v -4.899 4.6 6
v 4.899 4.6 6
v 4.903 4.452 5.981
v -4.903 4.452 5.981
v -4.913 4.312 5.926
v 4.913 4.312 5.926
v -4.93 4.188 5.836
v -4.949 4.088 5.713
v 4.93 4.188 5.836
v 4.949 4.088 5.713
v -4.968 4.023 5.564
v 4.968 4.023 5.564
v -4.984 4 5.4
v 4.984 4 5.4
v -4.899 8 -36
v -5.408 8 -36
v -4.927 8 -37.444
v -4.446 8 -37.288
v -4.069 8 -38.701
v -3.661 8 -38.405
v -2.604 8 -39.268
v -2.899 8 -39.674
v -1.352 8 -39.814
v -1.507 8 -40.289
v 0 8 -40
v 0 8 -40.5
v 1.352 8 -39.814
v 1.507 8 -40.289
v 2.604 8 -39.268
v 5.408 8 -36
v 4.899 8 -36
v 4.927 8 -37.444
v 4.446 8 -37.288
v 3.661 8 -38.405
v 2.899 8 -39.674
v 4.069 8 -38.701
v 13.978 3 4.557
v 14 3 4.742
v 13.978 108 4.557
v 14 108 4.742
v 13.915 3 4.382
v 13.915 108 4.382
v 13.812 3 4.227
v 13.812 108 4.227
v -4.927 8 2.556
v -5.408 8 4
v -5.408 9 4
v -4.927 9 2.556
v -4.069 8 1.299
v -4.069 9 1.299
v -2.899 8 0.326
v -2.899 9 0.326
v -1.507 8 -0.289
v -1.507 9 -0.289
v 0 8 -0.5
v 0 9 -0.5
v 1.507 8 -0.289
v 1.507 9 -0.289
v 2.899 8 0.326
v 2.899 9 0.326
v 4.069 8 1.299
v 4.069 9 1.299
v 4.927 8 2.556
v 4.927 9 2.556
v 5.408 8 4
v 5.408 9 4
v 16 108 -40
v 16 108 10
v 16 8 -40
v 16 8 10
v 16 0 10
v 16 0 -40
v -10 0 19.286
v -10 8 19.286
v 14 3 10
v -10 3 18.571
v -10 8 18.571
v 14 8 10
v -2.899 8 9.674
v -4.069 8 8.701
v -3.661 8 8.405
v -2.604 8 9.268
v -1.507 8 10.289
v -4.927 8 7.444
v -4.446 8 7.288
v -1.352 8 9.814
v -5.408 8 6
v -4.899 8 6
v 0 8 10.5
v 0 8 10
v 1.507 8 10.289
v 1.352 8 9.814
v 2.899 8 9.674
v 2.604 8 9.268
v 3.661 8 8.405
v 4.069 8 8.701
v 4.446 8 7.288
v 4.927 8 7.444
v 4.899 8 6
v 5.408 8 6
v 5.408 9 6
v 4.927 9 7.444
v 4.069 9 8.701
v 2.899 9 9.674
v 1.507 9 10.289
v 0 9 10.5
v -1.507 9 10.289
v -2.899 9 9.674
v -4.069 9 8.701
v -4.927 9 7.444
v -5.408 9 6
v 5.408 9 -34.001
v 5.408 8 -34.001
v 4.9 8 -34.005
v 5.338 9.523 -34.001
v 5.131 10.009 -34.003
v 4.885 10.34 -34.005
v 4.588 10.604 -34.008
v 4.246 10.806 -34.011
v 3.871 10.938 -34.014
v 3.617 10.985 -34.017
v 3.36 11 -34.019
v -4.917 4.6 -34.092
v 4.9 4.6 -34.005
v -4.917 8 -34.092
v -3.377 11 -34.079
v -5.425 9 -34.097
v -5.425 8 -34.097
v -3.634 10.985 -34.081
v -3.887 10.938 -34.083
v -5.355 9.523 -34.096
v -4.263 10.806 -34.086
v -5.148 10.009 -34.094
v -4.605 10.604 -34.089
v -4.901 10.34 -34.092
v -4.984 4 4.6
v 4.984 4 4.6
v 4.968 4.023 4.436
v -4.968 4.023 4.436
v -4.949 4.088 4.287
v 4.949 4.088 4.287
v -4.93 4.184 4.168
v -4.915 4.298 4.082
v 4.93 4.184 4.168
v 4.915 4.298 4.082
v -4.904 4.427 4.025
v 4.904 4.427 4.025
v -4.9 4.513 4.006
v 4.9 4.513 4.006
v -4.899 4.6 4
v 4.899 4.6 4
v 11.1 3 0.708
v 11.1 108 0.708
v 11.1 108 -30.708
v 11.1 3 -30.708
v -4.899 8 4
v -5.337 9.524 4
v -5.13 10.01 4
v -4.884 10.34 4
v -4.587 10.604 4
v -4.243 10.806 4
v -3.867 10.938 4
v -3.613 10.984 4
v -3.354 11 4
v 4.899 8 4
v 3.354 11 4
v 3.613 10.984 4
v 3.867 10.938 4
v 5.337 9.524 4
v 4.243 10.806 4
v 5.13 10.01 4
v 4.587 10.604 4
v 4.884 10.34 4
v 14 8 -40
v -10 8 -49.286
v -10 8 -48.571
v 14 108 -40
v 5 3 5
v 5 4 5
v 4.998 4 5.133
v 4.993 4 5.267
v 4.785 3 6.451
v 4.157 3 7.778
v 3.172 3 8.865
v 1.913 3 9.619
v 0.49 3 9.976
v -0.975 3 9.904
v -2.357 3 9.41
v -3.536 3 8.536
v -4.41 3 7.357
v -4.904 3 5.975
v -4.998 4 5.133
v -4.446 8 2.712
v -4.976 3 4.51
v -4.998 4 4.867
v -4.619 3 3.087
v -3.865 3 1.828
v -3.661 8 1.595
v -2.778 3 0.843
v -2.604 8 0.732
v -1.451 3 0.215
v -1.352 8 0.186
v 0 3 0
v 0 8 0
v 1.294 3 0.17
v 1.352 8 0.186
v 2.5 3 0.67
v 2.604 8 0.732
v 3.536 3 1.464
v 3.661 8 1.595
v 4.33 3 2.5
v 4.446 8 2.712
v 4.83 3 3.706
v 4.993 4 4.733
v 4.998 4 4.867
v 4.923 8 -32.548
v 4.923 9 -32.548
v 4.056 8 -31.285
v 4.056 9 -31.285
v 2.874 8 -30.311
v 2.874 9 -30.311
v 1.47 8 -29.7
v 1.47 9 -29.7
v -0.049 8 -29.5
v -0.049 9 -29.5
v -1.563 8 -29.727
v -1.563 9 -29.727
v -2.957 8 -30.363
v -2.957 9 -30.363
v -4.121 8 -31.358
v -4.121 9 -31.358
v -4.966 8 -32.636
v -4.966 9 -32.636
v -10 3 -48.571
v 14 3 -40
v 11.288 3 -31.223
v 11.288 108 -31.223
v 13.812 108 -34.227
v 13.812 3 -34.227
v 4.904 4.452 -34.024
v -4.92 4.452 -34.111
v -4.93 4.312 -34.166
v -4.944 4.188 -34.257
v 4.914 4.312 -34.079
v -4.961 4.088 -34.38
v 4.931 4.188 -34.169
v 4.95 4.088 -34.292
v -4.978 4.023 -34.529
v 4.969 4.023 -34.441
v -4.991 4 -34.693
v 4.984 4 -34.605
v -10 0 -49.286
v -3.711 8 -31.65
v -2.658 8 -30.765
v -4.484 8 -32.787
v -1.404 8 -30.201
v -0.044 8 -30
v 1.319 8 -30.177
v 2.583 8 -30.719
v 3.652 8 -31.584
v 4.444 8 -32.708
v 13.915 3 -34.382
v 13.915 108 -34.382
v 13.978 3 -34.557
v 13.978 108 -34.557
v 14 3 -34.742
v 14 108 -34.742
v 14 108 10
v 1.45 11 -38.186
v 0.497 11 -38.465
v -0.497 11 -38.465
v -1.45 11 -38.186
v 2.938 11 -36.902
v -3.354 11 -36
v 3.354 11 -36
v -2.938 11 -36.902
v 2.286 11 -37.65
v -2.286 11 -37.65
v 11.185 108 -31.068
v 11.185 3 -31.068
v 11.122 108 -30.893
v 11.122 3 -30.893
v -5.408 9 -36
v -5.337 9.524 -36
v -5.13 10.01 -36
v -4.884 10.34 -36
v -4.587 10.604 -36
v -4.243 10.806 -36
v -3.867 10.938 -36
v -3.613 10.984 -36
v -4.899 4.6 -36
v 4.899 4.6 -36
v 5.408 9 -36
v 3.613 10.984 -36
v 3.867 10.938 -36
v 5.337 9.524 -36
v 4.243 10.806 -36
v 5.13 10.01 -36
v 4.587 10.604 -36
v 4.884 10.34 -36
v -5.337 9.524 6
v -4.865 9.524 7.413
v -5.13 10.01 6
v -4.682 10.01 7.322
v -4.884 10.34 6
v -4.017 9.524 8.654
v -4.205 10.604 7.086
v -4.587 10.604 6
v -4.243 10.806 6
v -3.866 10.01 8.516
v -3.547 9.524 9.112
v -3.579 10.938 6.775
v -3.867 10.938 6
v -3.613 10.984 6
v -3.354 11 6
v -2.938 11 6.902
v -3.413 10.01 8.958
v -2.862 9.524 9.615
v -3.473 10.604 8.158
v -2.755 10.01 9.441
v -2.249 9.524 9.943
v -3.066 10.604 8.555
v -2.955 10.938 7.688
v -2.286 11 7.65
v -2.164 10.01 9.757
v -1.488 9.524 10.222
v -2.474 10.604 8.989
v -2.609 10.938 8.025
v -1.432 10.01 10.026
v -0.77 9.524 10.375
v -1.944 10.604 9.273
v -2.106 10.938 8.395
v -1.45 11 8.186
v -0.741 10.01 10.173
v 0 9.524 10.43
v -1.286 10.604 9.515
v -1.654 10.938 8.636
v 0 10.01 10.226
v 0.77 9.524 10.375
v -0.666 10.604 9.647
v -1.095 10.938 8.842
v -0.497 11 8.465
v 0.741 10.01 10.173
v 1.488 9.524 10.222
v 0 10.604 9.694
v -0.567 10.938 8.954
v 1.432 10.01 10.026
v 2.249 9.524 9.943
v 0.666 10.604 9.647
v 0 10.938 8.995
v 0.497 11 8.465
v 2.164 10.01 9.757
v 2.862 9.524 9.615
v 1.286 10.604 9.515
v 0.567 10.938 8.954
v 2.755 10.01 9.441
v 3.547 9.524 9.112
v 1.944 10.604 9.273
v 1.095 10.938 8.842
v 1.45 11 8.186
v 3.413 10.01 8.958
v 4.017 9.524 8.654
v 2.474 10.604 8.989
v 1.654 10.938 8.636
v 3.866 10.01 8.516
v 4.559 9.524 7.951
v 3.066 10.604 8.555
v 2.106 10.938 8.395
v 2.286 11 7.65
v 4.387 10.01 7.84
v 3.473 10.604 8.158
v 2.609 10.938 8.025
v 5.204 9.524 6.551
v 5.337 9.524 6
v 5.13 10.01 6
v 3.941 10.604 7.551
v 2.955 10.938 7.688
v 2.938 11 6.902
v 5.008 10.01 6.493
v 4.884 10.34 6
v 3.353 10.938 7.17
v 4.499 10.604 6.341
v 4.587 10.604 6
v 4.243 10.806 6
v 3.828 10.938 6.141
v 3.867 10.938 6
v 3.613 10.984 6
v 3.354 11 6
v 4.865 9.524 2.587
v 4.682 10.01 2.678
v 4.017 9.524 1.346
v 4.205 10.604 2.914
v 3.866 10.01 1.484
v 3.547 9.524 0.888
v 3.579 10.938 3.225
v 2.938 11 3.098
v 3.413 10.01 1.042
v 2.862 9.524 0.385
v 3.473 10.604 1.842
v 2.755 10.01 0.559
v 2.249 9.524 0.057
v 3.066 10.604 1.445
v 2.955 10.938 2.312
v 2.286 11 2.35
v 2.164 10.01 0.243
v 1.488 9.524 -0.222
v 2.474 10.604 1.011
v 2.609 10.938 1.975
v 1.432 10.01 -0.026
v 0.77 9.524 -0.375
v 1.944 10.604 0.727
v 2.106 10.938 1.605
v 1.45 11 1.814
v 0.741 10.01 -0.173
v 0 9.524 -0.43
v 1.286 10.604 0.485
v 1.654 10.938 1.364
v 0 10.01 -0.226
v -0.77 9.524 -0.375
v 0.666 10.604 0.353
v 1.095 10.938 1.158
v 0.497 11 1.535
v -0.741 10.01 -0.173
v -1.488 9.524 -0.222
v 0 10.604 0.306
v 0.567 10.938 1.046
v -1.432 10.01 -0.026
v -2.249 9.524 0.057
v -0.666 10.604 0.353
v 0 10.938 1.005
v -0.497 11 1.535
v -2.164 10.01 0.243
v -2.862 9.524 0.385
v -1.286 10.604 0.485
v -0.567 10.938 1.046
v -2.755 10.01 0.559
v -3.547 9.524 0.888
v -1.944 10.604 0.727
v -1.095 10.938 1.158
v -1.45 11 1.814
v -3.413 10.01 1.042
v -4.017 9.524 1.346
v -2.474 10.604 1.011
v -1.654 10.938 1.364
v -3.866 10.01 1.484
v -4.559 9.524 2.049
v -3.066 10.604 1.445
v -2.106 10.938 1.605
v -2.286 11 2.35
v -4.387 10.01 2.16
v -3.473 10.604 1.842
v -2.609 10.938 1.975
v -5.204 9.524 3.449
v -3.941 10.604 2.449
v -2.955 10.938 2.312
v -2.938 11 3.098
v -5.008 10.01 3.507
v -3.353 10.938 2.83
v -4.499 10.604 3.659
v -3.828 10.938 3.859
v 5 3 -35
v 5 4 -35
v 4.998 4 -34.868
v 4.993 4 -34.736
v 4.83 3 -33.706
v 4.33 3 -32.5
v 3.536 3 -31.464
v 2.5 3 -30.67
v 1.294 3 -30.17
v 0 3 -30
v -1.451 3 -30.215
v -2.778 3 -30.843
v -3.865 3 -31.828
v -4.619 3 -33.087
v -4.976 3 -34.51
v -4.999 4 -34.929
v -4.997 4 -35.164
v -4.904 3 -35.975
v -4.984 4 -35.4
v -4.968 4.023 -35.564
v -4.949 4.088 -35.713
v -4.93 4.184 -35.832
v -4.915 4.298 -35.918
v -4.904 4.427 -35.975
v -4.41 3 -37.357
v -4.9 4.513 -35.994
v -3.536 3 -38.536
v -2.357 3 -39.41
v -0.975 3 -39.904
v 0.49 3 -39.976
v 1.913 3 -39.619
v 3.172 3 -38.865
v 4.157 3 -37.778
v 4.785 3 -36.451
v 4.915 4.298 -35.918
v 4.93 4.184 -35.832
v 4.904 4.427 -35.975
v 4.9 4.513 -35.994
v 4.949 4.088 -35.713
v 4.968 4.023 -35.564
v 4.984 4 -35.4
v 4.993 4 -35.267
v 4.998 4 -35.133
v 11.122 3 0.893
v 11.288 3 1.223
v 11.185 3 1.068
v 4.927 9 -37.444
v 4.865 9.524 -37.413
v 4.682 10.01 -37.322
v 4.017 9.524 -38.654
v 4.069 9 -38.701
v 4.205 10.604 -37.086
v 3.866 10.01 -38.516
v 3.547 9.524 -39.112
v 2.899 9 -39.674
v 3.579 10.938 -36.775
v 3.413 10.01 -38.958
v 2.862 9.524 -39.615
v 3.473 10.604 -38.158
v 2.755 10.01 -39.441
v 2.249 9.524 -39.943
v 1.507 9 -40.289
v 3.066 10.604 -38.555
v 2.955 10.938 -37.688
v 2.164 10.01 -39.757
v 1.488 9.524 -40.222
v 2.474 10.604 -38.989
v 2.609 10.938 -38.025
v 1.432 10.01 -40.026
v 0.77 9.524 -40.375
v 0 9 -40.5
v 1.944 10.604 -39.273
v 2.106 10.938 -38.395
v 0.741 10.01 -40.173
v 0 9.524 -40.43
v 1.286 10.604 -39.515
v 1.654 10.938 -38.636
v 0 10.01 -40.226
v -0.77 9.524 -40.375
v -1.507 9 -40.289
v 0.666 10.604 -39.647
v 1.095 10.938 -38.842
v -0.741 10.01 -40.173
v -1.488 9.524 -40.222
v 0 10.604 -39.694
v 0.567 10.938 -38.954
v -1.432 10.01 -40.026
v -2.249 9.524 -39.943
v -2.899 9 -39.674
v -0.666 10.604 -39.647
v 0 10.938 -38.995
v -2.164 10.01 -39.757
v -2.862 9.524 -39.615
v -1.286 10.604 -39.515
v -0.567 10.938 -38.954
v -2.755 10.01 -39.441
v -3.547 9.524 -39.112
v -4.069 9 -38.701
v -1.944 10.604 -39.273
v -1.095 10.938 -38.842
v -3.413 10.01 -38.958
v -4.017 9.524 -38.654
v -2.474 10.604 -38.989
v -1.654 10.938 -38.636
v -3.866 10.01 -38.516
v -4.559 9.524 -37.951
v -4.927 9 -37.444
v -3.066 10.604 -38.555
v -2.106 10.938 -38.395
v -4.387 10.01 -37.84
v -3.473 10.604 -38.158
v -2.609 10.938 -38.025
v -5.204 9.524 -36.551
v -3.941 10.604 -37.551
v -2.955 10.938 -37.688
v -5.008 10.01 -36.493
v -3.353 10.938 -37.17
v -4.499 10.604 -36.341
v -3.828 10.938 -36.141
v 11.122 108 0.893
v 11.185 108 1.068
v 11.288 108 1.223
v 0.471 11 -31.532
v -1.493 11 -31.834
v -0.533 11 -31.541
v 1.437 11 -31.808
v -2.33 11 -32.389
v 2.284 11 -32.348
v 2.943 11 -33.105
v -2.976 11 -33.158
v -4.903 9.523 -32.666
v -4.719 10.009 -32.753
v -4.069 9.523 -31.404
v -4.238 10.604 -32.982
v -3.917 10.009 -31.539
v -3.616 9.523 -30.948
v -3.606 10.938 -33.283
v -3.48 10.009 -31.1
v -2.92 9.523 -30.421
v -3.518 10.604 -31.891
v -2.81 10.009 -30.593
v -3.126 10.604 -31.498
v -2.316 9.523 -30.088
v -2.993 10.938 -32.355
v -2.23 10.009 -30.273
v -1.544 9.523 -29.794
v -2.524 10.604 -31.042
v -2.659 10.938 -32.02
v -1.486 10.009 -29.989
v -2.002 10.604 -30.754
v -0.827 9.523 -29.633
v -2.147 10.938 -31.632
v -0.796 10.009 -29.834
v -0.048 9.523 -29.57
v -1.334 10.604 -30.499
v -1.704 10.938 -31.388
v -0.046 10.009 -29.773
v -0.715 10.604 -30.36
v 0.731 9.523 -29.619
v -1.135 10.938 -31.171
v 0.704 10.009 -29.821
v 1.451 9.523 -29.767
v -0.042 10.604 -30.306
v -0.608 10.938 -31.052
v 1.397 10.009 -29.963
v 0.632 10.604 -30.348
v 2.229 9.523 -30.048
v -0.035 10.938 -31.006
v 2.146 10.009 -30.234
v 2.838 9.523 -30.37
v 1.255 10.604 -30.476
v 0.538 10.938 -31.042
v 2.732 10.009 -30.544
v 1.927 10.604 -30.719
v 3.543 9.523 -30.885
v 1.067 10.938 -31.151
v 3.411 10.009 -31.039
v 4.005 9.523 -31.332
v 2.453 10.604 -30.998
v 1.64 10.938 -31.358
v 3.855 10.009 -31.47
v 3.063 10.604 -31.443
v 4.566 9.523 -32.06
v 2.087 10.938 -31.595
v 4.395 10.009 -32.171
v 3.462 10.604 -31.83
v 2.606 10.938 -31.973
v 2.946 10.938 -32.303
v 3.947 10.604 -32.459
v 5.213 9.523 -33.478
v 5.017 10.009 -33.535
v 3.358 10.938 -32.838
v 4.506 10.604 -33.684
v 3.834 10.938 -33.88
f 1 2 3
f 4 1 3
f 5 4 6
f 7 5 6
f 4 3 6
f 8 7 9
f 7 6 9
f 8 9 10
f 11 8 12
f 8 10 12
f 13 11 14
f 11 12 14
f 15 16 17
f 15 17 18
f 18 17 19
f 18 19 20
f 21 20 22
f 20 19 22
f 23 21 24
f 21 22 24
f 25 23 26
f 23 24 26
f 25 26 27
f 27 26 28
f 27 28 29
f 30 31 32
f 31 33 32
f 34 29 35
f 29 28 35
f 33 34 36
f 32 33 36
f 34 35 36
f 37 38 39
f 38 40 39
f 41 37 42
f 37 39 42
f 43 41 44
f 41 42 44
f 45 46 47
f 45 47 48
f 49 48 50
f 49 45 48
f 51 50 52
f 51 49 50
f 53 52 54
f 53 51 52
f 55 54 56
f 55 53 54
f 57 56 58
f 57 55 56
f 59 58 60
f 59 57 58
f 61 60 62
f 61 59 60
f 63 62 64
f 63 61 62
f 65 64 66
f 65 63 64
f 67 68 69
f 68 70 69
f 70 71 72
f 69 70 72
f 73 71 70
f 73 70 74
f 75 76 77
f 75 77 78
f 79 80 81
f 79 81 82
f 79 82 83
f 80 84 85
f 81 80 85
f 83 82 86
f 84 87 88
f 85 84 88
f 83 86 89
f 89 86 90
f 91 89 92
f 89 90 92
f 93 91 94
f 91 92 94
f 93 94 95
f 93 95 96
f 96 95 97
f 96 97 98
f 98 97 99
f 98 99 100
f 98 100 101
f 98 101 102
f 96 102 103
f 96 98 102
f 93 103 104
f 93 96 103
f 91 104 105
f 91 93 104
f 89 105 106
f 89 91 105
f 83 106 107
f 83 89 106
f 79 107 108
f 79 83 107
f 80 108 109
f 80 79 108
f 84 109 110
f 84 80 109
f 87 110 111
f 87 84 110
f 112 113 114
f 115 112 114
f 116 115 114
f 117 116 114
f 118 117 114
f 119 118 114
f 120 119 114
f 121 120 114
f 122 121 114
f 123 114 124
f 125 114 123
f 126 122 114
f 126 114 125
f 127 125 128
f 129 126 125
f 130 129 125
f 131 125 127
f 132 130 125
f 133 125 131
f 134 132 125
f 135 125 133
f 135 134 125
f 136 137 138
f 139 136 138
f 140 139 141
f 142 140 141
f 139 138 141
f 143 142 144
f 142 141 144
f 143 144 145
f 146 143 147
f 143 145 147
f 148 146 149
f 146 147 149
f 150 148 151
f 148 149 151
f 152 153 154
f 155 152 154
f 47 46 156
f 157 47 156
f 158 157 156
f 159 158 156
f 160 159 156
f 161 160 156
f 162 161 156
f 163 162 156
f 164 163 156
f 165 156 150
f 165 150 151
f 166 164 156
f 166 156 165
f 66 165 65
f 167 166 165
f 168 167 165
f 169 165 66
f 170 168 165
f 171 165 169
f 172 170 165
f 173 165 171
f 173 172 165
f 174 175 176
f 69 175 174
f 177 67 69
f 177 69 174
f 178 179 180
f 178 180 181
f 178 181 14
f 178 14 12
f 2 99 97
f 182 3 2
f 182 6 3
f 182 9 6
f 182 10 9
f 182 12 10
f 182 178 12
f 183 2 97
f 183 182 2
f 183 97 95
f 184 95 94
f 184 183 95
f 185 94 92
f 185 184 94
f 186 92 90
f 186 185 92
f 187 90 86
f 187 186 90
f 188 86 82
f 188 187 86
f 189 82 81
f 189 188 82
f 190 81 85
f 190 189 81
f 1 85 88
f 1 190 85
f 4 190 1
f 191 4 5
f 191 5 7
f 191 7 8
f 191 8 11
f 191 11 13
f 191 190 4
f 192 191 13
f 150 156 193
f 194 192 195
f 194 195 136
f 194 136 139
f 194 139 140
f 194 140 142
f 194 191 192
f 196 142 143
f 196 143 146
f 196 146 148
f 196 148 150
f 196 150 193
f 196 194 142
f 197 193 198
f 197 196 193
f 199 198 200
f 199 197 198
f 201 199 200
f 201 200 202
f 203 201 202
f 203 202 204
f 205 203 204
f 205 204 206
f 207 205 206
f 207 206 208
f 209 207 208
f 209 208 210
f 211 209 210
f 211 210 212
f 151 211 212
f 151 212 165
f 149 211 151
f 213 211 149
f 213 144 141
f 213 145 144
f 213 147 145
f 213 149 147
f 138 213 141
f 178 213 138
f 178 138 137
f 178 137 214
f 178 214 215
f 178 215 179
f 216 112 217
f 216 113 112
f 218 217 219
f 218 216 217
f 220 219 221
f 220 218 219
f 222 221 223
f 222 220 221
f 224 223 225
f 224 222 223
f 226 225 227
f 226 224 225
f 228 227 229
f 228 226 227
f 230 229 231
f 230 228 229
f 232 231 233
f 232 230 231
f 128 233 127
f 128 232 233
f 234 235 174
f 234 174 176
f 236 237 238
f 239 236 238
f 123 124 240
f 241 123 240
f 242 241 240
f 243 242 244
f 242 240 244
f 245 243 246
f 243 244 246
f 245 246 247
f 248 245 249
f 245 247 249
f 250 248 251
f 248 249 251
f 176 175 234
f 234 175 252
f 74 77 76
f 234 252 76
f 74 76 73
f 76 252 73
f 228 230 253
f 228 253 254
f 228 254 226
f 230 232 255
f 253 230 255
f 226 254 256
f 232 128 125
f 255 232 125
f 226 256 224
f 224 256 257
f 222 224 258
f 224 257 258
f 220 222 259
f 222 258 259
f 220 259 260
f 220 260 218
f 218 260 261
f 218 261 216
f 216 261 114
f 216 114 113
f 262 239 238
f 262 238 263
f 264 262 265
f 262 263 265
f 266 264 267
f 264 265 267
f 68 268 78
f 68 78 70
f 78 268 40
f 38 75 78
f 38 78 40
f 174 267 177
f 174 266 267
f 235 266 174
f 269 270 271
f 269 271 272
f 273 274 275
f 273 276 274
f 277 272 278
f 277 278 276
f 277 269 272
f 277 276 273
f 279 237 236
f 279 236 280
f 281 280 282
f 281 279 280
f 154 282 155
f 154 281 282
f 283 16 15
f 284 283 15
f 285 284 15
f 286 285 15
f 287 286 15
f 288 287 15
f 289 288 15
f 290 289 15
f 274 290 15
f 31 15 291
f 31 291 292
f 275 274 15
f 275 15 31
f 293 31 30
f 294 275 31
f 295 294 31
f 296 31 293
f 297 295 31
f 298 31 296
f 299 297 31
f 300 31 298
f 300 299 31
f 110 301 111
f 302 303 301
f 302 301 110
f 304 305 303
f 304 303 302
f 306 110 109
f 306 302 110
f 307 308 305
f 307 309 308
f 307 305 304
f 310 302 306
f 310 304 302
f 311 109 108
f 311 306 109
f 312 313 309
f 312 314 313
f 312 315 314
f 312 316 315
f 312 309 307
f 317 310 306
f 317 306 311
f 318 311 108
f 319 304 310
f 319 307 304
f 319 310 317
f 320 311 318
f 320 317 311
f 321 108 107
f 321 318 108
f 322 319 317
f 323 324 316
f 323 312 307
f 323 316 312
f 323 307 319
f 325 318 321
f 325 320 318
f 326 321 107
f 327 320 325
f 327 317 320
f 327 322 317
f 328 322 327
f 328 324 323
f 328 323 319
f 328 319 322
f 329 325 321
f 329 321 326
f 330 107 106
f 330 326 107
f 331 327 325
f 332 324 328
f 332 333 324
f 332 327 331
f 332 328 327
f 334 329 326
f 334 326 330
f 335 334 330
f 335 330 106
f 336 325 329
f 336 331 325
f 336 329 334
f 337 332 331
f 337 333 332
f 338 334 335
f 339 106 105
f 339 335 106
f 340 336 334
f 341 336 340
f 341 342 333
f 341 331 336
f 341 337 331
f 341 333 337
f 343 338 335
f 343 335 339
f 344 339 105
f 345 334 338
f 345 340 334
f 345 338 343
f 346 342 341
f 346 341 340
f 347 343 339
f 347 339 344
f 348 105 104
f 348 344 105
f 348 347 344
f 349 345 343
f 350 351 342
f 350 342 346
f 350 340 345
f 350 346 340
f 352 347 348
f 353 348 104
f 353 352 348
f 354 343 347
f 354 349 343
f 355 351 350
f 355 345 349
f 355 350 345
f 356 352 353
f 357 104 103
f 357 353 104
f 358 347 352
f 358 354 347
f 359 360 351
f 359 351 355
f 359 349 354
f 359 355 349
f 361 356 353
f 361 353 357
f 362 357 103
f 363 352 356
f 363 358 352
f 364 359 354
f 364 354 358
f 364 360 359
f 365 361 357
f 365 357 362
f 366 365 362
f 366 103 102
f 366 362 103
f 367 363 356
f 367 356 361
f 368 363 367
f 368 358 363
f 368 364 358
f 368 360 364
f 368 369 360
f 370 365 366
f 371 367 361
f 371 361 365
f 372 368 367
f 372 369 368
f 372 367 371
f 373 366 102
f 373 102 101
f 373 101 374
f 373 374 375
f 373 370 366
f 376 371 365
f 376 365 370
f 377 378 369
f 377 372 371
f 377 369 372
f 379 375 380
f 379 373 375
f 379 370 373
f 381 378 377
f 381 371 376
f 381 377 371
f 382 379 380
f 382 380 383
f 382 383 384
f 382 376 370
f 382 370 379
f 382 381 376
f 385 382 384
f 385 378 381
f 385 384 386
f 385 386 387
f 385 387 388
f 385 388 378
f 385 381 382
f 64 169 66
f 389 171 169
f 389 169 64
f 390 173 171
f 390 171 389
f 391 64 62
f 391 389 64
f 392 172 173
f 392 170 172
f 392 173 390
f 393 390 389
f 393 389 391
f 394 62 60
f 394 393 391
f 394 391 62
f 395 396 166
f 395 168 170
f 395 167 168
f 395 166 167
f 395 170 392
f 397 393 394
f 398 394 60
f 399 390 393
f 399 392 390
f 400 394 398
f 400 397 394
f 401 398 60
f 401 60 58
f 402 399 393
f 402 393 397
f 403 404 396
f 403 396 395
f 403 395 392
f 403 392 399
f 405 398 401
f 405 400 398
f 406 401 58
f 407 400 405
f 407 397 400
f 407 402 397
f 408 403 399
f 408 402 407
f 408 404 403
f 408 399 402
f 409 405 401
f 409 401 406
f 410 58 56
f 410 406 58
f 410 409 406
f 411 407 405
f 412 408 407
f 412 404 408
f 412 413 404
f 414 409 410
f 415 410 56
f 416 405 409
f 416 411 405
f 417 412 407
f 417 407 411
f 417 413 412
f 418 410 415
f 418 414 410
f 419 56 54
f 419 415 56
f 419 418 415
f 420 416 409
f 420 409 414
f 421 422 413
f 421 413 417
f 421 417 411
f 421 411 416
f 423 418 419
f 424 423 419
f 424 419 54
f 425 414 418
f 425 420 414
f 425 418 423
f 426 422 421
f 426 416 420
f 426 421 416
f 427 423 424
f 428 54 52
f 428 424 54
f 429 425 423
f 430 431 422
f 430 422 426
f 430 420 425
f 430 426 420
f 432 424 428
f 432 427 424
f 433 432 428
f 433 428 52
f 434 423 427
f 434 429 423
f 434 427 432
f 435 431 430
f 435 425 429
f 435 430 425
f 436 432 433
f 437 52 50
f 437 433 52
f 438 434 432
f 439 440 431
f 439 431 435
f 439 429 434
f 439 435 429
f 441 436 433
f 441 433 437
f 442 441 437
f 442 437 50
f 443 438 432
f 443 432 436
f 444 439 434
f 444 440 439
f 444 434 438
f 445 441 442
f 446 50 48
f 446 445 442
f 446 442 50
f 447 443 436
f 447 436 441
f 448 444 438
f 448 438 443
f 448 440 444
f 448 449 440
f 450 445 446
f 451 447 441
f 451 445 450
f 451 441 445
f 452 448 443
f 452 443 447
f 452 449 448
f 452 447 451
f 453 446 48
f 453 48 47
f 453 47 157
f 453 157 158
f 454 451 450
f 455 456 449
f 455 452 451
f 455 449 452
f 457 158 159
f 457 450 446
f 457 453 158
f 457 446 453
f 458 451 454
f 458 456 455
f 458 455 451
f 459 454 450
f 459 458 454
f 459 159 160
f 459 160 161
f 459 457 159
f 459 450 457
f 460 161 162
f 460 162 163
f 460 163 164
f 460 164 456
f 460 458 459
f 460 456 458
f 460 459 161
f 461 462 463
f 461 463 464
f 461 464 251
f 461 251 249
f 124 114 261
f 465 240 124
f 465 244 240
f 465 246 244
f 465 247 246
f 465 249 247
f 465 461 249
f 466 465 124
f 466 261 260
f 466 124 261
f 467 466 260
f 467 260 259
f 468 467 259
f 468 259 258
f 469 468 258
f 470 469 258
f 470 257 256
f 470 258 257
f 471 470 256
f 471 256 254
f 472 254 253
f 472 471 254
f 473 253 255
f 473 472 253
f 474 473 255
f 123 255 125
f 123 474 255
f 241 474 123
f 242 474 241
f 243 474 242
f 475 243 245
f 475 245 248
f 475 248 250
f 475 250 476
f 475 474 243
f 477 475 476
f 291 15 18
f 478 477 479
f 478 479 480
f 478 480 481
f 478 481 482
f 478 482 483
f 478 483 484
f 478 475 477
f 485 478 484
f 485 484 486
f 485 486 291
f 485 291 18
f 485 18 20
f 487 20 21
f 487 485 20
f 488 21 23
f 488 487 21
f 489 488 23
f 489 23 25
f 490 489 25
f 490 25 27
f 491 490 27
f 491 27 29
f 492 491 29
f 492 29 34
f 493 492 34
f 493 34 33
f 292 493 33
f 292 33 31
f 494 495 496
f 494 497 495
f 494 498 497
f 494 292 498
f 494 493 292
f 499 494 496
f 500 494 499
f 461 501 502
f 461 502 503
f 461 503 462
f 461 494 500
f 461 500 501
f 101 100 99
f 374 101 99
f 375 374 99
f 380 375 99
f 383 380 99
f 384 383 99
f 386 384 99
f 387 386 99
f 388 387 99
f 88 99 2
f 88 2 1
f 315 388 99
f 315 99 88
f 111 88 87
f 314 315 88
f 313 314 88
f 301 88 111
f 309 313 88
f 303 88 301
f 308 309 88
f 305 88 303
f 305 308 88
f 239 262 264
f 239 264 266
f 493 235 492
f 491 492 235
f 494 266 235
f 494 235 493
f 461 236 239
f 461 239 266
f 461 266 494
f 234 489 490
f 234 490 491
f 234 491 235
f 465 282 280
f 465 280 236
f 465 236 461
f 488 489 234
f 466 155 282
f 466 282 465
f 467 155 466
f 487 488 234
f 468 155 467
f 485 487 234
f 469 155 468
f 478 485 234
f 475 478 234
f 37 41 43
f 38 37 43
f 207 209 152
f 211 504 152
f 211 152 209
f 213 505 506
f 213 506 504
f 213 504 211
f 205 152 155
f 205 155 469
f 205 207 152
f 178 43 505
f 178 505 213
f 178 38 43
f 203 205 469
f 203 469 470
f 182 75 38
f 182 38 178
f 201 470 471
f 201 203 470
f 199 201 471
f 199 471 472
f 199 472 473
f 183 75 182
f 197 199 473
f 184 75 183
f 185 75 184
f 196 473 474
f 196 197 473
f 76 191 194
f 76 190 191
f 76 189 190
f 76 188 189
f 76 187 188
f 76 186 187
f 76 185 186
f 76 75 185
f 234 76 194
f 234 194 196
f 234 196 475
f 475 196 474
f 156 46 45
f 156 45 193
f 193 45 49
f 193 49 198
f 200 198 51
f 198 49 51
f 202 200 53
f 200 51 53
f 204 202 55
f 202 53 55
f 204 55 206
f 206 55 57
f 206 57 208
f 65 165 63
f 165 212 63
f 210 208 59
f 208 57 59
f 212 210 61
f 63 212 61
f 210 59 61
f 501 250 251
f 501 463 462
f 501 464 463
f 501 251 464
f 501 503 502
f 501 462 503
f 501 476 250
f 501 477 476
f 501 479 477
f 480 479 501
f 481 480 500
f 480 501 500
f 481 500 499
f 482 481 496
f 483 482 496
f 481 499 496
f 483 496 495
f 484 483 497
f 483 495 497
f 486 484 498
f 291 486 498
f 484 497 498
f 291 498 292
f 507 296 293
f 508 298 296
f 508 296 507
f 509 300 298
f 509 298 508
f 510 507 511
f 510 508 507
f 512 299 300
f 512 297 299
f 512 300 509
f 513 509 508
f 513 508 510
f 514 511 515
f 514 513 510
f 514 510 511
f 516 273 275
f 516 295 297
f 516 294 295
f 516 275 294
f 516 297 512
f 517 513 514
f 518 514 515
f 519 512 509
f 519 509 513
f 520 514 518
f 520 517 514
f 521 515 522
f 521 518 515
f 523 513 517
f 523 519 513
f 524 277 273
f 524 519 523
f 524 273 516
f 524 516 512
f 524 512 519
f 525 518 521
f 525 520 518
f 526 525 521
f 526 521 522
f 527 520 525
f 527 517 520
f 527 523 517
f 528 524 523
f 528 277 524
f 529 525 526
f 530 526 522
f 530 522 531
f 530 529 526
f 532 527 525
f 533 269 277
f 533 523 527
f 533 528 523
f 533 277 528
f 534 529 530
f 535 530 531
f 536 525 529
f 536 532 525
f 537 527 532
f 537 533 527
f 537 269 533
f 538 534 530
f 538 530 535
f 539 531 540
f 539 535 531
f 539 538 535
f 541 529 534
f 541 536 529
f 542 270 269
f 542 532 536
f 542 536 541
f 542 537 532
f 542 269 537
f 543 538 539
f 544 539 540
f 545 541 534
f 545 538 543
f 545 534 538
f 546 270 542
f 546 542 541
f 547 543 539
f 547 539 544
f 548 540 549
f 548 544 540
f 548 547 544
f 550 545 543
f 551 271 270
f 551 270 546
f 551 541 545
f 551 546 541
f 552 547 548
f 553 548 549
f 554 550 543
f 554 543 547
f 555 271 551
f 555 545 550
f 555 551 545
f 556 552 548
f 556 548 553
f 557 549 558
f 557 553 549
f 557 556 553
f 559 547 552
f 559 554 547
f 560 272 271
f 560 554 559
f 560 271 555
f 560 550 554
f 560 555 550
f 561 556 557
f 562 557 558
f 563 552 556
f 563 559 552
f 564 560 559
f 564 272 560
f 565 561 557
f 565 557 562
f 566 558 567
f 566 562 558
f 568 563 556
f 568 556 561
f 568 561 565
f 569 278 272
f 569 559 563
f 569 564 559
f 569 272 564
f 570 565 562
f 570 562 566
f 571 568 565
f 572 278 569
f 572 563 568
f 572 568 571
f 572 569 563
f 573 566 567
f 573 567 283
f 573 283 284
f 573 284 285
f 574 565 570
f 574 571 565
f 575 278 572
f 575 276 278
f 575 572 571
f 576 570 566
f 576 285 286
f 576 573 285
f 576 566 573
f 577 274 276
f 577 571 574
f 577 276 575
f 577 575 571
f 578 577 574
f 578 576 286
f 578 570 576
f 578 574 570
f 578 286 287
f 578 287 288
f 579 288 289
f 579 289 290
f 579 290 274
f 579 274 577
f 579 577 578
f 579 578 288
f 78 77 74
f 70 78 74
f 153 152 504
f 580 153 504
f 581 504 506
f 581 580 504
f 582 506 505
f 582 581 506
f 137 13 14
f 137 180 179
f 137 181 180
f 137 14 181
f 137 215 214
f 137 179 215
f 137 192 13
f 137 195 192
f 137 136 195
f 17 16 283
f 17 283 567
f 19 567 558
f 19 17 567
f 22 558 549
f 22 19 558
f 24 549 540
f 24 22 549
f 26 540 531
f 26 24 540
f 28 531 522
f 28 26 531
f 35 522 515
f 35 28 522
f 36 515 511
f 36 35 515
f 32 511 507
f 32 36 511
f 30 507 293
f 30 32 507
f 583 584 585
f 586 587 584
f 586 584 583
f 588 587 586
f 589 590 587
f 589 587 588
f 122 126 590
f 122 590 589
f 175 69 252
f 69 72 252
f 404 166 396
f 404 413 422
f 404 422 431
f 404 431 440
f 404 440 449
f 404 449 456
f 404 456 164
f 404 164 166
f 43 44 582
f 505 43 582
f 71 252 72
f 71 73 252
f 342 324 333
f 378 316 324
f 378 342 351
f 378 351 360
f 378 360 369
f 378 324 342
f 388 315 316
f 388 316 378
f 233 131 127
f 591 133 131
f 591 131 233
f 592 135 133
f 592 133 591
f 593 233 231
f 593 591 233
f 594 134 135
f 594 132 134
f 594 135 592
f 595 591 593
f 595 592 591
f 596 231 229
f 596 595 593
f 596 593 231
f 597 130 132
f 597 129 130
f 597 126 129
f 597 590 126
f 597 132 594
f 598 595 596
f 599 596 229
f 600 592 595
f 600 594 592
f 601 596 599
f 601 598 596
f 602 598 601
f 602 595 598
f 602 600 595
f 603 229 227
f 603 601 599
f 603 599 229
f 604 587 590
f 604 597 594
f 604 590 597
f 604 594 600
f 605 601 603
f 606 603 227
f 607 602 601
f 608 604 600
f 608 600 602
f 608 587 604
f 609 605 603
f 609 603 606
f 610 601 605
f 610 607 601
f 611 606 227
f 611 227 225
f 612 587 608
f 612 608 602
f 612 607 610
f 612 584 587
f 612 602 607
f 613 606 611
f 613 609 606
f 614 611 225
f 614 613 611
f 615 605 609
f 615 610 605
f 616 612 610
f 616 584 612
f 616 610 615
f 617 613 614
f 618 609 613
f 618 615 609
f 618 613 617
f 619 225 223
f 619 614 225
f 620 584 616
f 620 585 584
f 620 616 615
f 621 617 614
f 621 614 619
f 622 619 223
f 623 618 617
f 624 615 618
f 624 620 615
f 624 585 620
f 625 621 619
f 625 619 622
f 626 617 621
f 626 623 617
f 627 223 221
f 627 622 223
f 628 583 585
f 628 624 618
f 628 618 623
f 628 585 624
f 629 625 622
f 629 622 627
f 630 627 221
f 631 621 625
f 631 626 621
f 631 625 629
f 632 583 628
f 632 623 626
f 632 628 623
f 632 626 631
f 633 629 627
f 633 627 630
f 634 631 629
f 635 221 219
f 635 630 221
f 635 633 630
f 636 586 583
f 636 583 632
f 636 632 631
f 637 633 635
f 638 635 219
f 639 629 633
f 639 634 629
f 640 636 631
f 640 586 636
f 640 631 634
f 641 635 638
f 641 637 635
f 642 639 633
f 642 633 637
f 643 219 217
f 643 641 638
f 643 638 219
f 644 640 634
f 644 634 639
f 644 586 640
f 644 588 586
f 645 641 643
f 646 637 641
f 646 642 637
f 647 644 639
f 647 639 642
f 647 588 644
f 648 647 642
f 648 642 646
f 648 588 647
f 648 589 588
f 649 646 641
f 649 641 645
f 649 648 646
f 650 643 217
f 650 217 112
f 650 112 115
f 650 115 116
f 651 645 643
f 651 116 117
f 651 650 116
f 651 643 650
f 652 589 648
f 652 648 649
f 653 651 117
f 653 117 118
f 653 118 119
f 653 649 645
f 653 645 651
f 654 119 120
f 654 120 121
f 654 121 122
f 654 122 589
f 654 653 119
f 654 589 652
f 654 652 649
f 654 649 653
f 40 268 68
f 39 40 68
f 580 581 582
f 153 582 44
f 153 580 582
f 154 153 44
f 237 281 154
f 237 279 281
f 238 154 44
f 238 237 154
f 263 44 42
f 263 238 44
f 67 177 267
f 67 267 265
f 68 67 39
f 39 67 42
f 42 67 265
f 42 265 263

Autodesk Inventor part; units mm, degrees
ref_plane "YZ Plane" through (0, 0, 0) normal (1, 0, 0) x (0, 1, 0)
ref_plane "XZ Plane" through (0, 0, 0) normal (0, 1, 0) x (-1, 0, 0)
ref_plane "XY Plane" through (0, 0, 0) normal (0, 0, 1) x (1, 0, 0)
sketch "Sketch1" plane through (0, 0, 0) normal (0, 1, 0) x (-1, 0, 0)
  line L0 (0, 0) -> (0, -30)
  circle A0 centre (0, 5) radius 5
  circle A1 centre (0, -35) radius 5
  line L1 (-5, 5) -> (-14, 5) construction
  line L2 (0, 10) -> (0, 15) construction
  line L3 (0, 10) -> (-14, 10) construction
  line L4 (5, 5) -> (10, 5) construction
  line L5 (-14, 5) -> (-11.1, 5) construction
  line L6 (0, 0) -> (-14, 0) construction
  line L7 (-11.1, 0) -> (-11.1, 1) construction
  line L8 (5, -35) -> (10, -35) construction
  line L9 (0, -40) -> (0, -45) construction
  line L10 (-5, -35) -> (-14, -35) construction
  line L11 (0, -40) -> (-14, -40) construction
  line L12 (0, -30) -> (-14, -30) construction
  line L13 (-11.1, -30) -> (-11.1, -31) construction
  line L14 (-14, 10) -> (0, 15)
  line L15 (0, 15) -> (10, 18.5714)
  line L16 (-14, -40) -> (0, -45)
  line L17 (0, -45) -> (10, -48.5714)
  line L18 (10, -48.5714) -> (10, 18.5714)
  line L19 (-14, 10) -> (-14, 5)
  line L20 (-11.1, 1) -> (-11.1, -31)
  line L21 (-14, -40) -> (-14, -35)
  line L22 (-14, 10) -> (-14, 3.9) construction
  line L23 (-14, -40) -> (-14, -33.9) construction
  line L24 (-11.1, 1) -> (-14, 4.45)
  line L25 (-11.1, -31) -> (-14, -34.45)
  line L26 (-14, 4.45) -> (-14, 5)
  line L27 (-14, -34.45) -> (-14, -35)
  dimension "d0" = 30
  dimension "d3" = 9
  dimension "d4" = 5
  dimension "d5" = 5
  dimension "d6" = 2.9
  dimension "d7" = 1
  dimension "d8" = 5
  dimension "d9" = 1
  dimension "d10" = 6.1
  dimension "d11" = 6.1
extrude "Extrusion3" add sketch "Sketch1" along normal blind 3
sketch "Sketch4" plane through (0, 3, 0) normal (0, 1, 0) x (1, 0, 0)
  circle A0 centre (0, 35) radius 5 projected
  circle A1 centre (0, -5) radius 5 projected
  point P0 (0, 0)
sketch "Sketch5" plane through (0, 3, 0) normal (0, 1, 0) x (1, 0, 0)
  point P0 (0, 0)
extrude "Extrusion4" add sketch "Sketch4" along normal blind 5
sketch "Sketch6" plane through (0, 8, 5) normal (0, 1, 0) x (1, 0, 0)
  circle A0 centre (0, 0) radius 5.5
  circle A1 centre (0, 40) radius 5 projected
  circle A2 centre (0, 40) radius 5.5
  point P0 (0, 5)
  dimension "d20" = 11
  dimension "d21" = 11
extrude "Extrusion5" add sketch "Sketch6" along normal blind 3 contours A0 | A1 | A2
fillet "Fillet1" radius 2 2 edges at (-5.5, 11, 5) (-5.5, 11, -35)
sketch "Sketch7" plane through (0, 11, 5) normal (0, 1, 0) x (1, 0, 0)
  circle A0 centre (0, 0) radius 3.5 projected
  circle A1 centre (0, 40) radius 3.5 projected
  circle A2 centre (0, 0) radius 5.5 projected
  line L0 (-5.5, 0) -> (-5.5, 1)
  line L1 (-5.5, 1) -> (5.5, 1)
  line L2 (5.5, 1) -> (5.5, -1)
  line L3 (5.5, -1) -> (-5.5, -1)
  line L4 (-5.5, -1) -> (-5.5, 0)
  line L5 (-5.5, 40) -> (-5.5, 41)
  line L6 (-5.5, 41) -> (5.5, 41)
  line L7 (5.5, 41) -> (5.5, 39)
  line L8 (5.5, 39) -> (-5.5, 39.0974)
  line L9 (-5.5, 39.0974) -> (-5.5, 40)
  circle A3 centre (0, 40) radius 5.5 projected
  point P0 (0, 5)
  dimension "d25" = 1
  dimension "d26" = 2
  dimension "d27" = 1
  dimension "d28" = 2
extrude "Extrusion6" cut sketch "Sketch7" against normal blind 7 contours A0 L3 L1 | A0 L1 A2 L3 | A0 L3 A2 L1 | L1 L2 A2 | A2 L2 L3 | A2 L0 L1 | L3 L4 A2 | A1 L8 L6 | A1 L6 A3 L8 | A1 L8 A3 L6 | L6 L7 A3 | A3 L7 L8 | A3 L5 L6 | L8 L9 A3
fillet "Fillet2" radius 0.6 4 edges at (0, 4, 6) (0, 4, 4) (-0.0084, 4, -34.0488) (0, 4, -36)
sketch "Sketch8" plane through (0, 0, 0) normal (0, -1, 0) x (1, 0, 0)
  circle A0 centre (0, 5) radius 5 projected
  circle A1 centre (0, -35) radius 5 projected
  point P0 (0, 0)
extrude "Extrusion7" add sketch "Sketch8" against normal blind 3
sketch "Sketch9" plane through (0, 3, 0) normal (0, 1, 0) x (1, 0, 0)
  circle A0 centre (0, 35) radius 5 projected
  circle A1 centre (0, -5) radius 5 projected
  line L0 (14, -10) -> (14, -4.45) projected
  line L1 (14, -4.45) -> (11.1, -1) projected
  line L2 (11.1, -1) -> (11.1, 31) projected
  line L3 (11.1, 31) -> (14, 34.45) projected
  line L4 (14, 34.45) -> (14, 40) projected
  line L5 (14, 40) -> (-10, 48.5714) projected
  line L6 (-10, 48.5714) -> (-10, -18.5714) projected
  line L7 (-10, -18.5714) -> (14, -10) projected
  line L8 (14, -10) -> (16, -10)
  line L9 (16, -10) -> (16, 40)
  line L10 (16, 40) -> (14, 40)
  point P0 (0, 0)
  dimension "d34" = 2
extrude "Extrusion8" add sketch "Sketch9" along normal blind 105 contours L0 L1 L2 L3 L4 L10 L9 L8
sketch "Sketch10" plane through (0, 0, 0) normal (0, -1, 0) x (1, 0, 0)
  line L0 (14, 4.45) -> (14, 10) projected
  line L1 (14, 10) -> (-10, 18.5714) projected
  line L2 (-10, 18.5714) -> (-10, -48.5714) projected
  line L3 (-10, -48.5714) -> (14, -40) projected
  line L4 (14, -40) -> (14, -34.45) projected
  line L5 (14, -34.45) -> (11.1, -31) projected
  line L6 (11.1, -31) -> (11.1, 1) projected
  line L7 (11.1, 1) -> (14, 4.45) projected
  line L8 (14, 10) -> (16, 10) projected
  line L9 (14, 10) -> (14, 4.45) projected
  line L10 (14, 4.45) -> (11.1, 1) projected
  line L11 (11.1, 1) -> (11.1, -31) projected
  line L12 (11.1, -31) -> (14, -34.45) projected
  line L13 (14, -34.45) -> (14, -40) projected
  line L14 (16, -40) -> (14, -40) projected
  line L15 (16, 10) -> (16, -40) projected
  point P0 (0, 0)
extrude "Extrusion9" add sketch "Sketch10" against normal blind 3 contours L0 L8 L15 L14 L4 L5 L6 L7
fillet "Fillet3" radius 0.8 4 edges at (11.1, 55.5, 1) (14, 55.5, 4.45) (14, 55.5, -34.45) (11.1, 55.5, -31)
sketch "Sketch11" plane through (0, 3, 0) normal (0, 1, 0) x (1, 0, 0)
  arc A0 (13.8124, 34.2268) -> (14, 34.7416) centre (13.2, 34.7416) ccw projected
  line L0 (14, 34.7416) -> (14, 40) projected
  line L1 (14, 40) -> (-10, 48.5714) projected
  line L2 (-10, 48.5714) -> (-10, -18.5714) projected
  line L3 (-10, -18.5714) -> (14, -10) projected
  line L4 (14, -10) -> (14, -4.7416) projected
  arc A1 (14, -4.7416) -> (13.8124, -4.2268) centre (13.2, -4.7416) ccw projected
  line L5 (13.8124, -4.2268) -> (11.2876, -1.2232) projected
  arc A2 (11.1, -0.7084) -> (11.2876, -1.2232) centre (11.9, -0.7084) ccw projected
  line L6 (11.1, -0.7084) -> (11.1, 30.7084) projected
  arc A3 (11.2876, 31.2232) -> (11.1, 30.7084) centre (11.9, 30.7084) ccw projected
  line L7 (11.2876, 31.2232) -> (13.8124, 34.2268) projected
  circle A4 centre (0, -5) radius 5 projected
  circle A5 centre (0, 35) radius 5 projected
  line L8 (-10, 48.5714) -> (-10, -18.5714) projected
  line L9 (-10, 48.5714) -> (-10, 52.4265)
  line L10 (11.1, 40) -> (23.5531, 40)
  line L11 (16, 40) -> (14, 40) projected
  line L12 (16, 40) -> (-10, 49.2857)
  line L13 (14, -10) -> (19.1534, -10)
  line L14 (-10, -18.5714) -> (14, -10) projected
  line L15 (-10, -18.5714) -> (-10, -22.2627)
  line L16 (16, -10) -> (16, 40) projected
  line L17 (16, -10) -> (-10, -19.2857)
  point P0 (0, 0)
extrude "Extrusion10" add sketch "Sketch11" along normal blind 5 contours L1 L9 L12 L10 | L3 L13 L17 L15
sketch "Sketch12" plane through (0, 0, 0) normal (0, -1, 0) x (1, 0, 0)
  line L0 (14, -40) -> (16, -40) projected
  line L1 (14, -40) -> (-10, -48.5714) projected
  line L2 (-10, -49.2857) -> (-10, -48.5714) projected
  line L3 (16, -40) -> (-10, -49.2857) projected
  line L4 (-10, 18.5714) -> (-10, 19.2857) projected
  line L5 (-10, 18.5714) -> (14, 10) projected
  line L6 (16, 10) -> (14, 10) projected
  line L7 (-10, 19.2857) -> (16, 10) projected
  point P0 (0, 0)
extrude "Extrusion11" add sketch "Sketch12" against normal blind 3
properties part number "SOPORTE"
